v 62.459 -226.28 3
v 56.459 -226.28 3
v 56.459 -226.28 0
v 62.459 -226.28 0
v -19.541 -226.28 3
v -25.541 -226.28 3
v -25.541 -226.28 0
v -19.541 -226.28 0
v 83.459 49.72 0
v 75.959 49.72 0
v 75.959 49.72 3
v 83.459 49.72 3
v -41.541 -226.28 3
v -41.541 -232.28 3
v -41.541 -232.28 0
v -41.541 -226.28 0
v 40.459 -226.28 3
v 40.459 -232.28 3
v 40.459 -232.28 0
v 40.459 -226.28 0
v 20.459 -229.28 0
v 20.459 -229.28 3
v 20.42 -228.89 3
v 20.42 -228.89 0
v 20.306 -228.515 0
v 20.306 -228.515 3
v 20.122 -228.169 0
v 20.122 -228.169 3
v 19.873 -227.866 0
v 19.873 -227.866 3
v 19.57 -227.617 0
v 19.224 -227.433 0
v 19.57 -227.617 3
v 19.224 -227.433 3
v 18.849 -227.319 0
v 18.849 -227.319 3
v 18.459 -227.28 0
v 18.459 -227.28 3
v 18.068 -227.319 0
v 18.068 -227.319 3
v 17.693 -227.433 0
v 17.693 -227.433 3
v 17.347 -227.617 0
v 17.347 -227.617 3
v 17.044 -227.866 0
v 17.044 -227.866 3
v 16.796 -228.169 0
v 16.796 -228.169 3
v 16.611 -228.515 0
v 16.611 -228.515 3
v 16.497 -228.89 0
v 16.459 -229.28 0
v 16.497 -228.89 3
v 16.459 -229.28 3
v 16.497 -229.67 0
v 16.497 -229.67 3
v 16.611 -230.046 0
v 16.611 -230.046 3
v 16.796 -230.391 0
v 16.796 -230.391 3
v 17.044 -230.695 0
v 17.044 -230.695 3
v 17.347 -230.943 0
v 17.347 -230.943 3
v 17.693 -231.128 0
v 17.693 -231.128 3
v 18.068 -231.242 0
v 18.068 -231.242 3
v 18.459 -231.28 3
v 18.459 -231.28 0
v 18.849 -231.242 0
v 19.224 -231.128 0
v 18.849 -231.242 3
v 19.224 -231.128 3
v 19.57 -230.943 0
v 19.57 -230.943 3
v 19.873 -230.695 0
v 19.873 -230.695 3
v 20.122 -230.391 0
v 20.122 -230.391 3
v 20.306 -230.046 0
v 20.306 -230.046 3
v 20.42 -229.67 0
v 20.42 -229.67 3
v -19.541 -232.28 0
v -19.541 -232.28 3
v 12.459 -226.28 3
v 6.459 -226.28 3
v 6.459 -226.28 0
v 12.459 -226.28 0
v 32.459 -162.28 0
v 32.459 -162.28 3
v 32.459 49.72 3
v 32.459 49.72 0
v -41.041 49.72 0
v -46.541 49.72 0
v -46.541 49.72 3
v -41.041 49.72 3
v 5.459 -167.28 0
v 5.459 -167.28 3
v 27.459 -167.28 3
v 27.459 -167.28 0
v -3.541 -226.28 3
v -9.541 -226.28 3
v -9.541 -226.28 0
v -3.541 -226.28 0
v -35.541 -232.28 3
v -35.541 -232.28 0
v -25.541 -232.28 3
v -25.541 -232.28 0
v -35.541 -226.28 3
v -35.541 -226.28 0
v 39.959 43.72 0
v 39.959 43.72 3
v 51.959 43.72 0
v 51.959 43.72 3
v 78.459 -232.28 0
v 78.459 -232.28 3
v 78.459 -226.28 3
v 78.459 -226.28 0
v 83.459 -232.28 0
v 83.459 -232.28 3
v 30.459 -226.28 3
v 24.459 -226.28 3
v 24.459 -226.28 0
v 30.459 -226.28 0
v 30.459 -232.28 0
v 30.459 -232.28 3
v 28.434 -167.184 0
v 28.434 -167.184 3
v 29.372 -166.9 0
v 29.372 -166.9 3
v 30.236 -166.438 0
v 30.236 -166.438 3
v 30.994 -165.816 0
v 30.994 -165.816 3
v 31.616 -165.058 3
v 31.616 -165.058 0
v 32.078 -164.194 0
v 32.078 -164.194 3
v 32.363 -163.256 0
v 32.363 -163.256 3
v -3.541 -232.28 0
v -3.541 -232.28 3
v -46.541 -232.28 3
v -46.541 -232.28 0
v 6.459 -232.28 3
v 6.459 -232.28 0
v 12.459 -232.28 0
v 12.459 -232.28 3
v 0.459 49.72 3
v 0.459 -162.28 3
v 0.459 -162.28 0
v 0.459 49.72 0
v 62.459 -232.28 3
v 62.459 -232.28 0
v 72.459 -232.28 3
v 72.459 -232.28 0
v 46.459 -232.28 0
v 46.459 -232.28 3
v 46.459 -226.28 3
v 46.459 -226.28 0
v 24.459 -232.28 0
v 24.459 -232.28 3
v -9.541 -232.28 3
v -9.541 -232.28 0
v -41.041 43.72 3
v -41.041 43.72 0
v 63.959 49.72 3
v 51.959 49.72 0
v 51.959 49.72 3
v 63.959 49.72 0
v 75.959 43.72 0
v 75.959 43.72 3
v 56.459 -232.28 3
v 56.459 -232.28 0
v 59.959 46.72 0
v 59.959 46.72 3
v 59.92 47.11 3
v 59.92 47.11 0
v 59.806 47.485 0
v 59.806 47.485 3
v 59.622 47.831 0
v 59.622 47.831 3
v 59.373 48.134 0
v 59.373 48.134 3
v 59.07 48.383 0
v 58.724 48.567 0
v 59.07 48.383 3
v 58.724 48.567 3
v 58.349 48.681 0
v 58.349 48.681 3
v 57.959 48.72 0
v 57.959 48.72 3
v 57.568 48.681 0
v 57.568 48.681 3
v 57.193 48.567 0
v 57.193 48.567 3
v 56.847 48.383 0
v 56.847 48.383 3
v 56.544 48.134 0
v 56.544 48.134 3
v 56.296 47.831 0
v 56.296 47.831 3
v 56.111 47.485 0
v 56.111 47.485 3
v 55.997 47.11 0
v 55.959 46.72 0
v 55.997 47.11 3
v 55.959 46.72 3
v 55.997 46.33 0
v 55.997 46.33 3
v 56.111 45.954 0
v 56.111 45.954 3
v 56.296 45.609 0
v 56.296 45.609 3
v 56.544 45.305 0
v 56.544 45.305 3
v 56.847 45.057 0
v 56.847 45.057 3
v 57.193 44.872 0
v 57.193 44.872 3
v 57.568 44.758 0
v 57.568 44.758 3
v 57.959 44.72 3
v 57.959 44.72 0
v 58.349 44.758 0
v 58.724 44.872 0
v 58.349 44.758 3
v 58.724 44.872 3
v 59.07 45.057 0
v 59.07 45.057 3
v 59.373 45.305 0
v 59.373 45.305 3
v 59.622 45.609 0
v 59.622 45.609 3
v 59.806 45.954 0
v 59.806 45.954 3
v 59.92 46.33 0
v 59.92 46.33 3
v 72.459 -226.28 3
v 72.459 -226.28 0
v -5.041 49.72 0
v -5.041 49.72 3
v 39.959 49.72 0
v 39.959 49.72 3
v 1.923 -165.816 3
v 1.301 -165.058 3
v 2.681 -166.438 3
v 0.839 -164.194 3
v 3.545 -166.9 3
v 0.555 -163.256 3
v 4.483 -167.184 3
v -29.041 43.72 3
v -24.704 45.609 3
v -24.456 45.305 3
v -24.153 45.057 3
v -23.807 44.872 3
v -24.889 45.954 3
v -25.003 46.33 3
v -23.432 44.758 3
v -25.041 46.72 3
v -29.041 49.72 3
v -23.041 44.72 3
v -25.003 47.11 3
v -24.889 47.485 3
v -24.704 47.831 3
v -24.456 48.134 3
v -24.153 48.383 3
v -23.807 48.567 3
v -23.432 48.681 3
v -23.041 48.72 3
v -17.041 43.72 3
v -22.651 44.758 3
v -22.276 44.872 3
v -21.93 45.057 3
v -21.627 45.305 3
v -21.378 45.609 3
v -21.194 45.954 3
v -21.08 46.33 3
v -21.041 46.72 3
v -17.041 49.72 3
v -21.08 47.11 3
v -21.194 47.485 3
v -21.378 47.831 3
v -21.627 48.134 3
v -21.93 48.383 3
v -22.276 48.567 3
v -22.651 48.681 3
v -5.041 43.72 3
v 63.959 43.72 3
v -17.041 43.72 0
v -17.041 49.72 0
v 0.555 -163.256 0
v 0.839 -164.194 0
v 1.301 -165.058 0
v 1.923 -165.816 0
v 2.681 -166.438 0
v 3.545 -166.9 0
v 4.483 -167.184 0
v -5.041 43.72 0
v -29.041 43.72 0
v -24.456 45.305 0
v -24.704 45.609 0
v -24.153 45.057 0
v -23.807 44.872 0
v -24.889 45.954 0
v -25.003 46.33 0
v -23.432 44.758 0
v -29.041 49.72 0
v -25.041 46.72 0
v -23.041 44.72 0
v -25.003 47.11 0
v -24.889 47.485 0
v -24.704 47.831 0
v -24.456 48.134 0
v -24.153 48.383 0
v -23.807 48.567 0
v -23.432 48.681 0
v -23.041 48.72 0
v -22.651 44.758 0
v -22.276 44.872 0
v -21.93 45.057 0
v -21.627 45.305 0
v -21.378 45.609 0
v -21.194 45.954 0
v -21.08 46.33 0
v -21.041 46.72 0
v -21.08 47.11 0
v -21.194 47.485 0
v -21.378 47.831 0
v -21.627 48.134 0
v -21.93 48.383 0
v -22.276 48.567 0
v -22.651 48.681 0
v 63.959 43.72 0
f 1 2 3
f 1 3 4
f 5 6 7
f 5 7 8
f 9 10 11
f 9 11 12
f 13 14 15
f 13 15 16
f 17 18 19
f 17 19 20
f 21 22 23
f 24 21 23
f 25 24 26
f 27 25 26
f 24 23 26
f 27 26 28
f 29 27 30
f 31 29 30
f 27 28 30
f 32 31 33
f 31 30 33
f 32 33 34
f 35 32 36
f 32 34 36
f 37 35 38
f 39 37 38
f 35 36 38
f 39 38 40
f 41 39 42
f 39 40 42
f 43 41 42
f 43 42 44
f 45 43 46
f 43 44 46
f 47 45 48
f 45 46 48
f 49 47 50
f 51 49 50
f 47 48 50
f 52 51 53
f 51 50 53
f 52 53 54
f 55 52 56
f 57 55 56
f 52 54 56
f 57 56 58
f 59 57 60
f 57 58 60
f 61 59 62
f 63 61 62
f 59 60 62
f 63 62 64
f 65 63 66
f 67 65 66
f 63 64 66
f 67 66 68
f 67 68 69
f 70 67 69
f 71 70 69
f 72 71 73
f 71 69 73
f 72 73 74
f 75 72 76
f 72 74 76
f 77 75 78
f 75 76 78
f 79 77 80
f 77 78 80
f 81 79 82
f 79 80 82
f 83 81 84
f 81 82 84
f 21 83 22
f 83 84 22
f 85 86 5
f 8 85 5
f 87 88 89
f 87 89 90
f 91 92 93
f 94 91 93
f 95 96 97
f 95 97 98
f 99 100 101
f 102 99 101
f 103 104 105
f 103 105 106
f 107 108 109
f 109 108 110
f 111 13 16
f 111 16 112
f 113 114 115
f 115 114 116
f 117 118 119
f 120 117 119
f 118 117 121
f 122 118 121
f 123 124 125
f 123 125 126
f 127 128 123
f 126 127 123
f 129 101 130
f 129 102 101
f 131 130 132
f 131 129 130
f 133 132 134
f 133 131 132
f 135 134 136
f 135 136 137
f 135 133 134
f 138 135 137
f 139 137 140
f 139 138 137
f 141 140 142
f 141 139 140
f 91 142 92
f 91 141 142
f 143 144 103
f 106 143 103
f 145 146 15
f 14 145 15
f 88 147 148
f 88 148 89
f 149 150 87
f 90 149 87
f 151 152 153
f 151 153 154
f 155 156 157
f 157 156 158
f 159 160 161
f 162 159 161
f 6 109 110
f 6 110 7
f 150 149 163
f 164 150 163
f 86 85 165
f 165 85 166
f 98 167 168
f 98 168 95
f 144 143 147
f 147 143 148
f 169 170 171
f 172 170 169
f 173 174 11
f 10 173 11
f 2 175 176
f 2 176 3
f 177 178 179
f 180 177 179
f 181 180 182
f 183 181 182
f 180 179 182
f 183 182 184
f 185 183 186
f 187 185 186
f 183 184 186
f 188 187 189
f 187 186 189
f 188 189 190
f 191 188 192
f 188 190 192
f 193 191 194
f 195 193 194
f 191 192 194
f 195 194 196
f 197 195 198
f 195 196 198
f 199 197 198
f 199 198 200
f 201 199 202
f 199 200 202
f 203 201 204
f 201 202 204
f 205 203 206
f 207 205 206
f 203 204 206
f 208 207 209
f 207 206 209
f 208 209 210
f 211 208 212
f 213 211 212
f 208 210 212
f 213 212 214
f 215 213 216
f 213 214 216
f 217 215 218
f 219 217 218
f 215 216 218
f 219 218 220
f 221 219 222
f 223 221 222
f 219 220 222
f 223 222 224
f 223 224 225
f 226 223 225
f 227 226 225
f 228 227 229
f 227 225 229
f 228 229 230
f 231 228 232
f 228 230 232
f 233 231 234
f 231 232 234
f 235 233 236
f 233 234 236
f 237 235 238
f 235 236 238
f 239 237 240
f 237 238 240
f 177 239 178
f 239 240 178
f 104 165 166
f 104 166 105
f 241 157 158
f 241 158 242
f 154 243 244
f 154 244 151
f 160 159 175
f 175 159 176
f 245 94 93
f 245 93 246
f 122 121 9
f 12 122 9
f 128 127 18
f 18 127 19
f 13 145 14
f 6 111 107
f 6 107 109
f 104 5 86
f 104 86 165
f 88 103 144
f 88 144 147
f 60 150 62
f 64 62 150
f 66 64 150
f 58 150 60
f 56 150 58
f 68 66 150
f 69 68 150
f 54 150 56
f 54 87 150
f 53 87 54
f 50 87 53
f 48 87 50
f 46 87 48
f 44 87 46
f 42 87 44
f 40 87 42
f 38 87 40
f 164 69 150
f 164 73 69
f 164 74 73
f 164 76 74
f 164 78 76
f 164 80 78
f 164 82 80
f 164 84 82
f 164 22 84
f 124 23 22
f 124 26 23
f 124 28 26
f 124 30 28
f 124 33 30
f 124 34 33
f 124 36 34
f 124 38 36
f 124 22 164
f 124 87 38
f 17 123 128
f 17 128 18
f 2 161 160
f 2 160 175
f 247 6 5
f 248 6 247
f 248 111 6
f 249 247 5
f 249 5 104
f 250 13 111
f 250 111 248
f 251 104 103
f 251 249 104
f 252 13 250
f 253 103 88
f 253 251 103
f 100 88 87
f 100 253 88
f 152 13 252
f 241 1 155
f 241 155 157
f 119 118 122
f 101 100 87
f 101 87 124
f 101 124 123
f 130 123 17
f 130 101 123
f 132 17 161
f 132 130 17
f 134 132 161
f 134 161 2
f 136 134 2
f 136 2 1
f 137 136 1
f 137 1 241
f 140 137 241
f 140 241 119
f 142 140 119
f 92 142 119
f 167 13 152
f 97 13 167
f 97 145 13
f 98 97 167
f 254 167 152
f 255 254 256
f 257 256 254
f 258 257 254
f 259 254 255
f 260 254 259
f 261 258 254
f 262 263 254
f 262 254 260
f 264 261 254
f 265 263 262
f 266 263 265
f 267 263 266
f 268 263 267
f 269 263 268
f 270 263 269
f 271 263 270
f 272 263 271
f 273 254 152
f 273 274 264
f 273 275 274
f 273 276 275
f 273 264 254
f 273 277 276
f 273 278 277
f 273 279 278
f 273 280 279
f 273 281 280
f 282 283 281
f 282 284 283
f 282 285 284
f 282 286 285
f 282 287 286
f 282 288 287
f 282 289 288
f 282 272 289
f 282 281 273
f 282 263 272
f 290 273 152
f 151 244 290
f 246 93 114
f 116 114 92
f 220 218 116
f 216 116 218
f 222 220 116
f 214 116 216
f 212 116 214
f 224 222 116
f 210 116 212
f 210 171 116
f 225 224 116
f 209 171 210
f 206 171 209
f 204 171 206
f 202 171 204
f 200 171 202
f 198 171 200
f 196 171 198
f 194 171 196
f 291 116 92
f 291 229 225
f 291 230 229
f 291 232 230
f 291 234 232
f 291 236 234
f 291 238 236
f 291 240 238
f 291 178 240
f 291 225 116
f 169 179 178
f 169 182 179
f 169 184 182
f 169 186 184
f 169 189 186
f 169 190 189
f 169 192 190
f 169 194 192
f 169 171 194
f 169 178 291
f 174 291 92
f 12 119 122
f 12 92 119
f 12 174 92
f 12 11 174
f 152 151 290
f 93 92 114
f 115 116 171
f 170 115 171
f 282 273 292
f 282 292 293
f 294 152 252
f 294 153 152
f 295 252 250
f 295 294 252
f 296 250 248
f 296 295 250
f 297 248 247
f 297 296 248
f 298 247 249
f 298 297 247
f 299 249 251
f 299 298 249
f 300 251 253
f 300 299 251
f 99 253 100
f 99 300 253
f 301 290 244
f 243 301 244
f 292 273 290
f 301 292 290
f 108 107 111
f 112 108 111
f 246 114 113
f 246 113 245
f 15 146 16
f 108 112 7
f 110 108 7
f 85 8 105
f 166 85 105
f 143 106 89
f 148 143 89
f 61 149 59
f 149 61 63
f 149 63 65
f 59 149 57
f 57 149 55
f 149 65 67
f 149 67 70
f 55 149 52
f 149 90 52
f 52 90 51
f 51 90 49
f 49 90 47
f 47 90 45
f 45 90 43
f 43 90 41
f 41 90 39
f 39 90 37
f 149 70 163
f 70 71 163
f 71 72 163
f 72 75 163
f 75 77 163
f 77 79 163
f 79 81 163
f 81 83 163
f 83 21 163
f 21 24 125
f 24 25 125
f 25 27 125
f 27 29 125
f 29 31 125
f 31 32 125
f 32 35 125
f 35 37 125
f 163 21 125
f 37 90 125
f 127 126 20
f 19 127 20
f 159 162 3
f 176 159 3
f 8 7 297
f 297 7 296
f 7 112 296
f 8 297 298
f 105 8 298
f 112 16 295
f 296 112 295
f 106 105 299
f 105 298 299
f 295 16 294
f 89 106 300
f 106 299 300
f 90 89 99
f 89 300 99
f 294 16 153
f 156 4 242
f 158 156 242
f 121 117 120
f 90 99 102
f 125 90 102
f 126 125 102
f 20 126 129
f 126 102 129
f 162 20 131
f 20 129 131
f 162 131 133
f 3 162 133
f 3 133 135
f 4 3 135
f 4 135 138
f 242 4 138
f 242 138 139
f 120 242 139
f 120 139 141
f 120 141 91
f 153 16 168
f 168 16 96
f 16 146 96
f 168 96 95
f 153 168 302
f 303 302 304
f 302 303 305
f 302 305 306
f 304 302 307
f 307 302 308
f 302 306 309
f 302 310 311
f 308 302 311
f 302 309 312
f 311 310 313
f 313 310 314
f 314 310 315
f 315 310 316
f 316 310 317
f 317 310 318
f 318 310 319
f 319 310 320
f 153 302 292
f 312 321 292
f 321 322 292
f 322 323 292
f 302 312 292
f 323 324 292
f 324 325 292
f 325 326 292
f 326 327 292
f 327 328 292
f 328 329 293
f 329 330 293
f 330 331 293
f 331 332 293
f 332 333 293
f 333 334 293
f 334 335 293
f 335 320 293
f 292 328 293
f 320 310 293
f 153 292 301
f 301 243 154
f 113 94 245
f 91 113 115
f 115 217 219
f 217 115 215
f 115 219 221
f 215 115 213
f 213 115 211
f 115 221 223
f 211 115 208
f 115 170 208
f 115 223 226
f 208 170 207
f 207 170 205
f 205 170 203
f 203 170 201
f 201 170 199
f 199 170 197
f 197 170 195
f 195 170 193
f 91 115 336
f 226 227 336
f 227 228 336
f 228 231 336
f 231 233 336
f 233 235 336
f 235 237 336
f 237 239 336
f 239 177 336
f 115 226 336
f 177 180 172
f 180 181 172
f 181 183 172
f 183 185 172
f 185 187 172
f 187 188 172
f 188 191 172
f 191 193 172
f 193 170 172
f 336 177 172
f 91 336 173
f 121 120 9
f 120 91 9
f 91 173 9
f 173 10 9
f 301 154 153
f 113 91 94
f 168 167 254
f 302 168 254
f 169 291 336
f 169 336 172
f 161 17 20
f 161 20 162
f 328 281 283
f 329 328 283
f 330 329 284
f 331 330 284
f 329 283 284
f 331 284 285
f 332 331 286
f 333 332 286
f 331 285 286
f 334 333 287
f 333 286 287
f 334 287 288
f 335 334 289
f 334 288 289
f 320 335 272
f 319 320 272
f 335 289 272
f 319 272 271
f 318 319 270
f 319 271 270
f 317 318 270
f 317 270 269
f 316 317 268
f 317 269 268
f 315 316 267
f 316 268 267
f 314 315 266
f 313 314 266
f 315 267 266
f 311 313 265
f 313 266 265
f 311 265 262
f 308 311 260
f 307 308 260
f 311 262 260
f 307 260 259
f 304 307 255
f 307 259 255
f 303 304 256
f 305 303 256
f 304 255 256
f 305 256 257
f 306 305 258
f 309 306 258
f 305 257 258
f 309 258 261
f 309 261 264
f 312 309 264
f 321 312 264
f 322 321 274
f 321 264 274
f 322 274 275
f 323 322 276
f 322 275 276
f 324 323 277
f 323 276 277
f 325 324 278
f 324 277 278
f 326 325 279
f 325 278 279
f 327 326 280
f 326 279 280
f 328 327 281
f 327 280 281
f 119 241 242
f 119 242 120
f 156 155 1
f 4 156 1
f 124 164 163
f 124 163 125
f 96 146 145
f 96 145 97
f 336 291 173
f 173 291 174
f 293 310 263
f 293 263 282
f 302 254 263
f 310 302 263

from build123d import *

# Parameters (mm, degrees)
ESQUISSE1_W             = 130
ESQUISSE1_H             = 282
BOSS_EXTRU_1_DEPTH      = 3
ESQUISSE2_W             = 32
ESQUISSE2_H             = 217
ENL_V_MAT_EXTRU_1_DEPTH = 3
CONG_1_R                = 5
ESQUISSE3_R             = 2
ESQUISSE3_W             = 12
ESQUISSE3_H             = 6
ESQUISSE3_W_2           = 6
ENL_V_MAT_EXTRU_2_DEPTH = 3


with BuildPart() as part:
    # Esquisse1 → Boss.-Extru.1 (new body)
    with BuildSketch(Plane.XY):
        with Locations((18.458602023, -91.280290456)):
            Rectangle(ESQUISSE1_W, ESQUISSE1_H)
    extrude(amount=BOSS_EXTRU_1_DEPTH)

    # Esquisse2 → Enlèv. mat.-Extru.1 (cut)
    with BuildSketch(Plane.XY.offset(3)):
        with Locations((16.458602023, -58.780290456)):
            Rectangle(ESQUISSE2_W, ESQUISSE2_H)
    extrude(amount=-ENL_V_MAT_EXTRU_1_DEPTH, mode=Mode.SUBTRACT)

    # Congé1
    cong_1_edges = [part.edges().sort_by_distance(p)[0] for p in [
        (32.458602023, -167.280290456, 1.5),
        (0.458602023, -167.280290456, 1.5),
    ]]
    fillet(cong_1_edges, radius=CONG_1_R)

    # Esquisse3 → Enlèv. mat.-Extru.2 (cut)
    with BuildSketch(Plane.XY.offset(3)):
        with Locations((-23.041397977, 46.719709544)):
            Circle(ESQUISSE3_R)
        with Locations((57.958602023, 46.719709544)):
            Circle(ESQUISSE3_R)
        with Locations((18.458602023, -229.280290456)):
            Circle(ESQUISSE3_R)
        with Locations((-35.041397977, 46.719709544)):
            Rectangle(ESQUISSE3_W, ESQUISSE3_H)
        with Locations((-11.041397977, 46.719709544)):
            Rectangle(ESQUISSE3_W, ESQUISSE3_H)
        with Locations((45.958602023, 46.719709544)):
            Rectangle(ESQUISSE3_W, ESQUISSE3_H)
        with Locations((69.958602023, 46.719709544)):
            Rectangle(ESQUISSE3_W, ESQUISSE3_H)
        with Locations((9.458602023, -229.280290456)):
            Rectangle(ESQUISSE3_W_2, ESQUISSE3_H)
        with Locations((-6.541397977, -229.280290456)):
            Rectangle(ESQUISSE3_W_2, ESQUISSE3_H)
        with Locations((-38.541397977, -229.280290456)):
            Rectangle(ESQUISSE3_W_2, ESQUISSE3_H)
        with Locations((27.458602023, -229.280290456)):
            Rectangle(ESQUISSE3_W_2, ESQUISSE3_H)
        with Locations((43.458602023, -229.280290456)):
            Rectangle(ESQUISSE3_W_2, ESQUISSE3_H)
        with Locations((75.458602023, -229.280290456)):
            Rectangle(ESQUISSE3_W_2, ESQUISSE3_H)
        with Locations((-22.541397977, -229.280290456)):
            Rectangle(ESQUISSE3_W_2, ESQUISSE3_H)
        with Locations((59.458602023, -229.280290456)):
            Rectangle(ESQUISSE3_W_2, ESQUISSE3_H)
    extrude(amount=-ENL_V_MAT_EXTRU_2_DEPTH, mode=Mode.SUBTRACT)


solid = part.part
